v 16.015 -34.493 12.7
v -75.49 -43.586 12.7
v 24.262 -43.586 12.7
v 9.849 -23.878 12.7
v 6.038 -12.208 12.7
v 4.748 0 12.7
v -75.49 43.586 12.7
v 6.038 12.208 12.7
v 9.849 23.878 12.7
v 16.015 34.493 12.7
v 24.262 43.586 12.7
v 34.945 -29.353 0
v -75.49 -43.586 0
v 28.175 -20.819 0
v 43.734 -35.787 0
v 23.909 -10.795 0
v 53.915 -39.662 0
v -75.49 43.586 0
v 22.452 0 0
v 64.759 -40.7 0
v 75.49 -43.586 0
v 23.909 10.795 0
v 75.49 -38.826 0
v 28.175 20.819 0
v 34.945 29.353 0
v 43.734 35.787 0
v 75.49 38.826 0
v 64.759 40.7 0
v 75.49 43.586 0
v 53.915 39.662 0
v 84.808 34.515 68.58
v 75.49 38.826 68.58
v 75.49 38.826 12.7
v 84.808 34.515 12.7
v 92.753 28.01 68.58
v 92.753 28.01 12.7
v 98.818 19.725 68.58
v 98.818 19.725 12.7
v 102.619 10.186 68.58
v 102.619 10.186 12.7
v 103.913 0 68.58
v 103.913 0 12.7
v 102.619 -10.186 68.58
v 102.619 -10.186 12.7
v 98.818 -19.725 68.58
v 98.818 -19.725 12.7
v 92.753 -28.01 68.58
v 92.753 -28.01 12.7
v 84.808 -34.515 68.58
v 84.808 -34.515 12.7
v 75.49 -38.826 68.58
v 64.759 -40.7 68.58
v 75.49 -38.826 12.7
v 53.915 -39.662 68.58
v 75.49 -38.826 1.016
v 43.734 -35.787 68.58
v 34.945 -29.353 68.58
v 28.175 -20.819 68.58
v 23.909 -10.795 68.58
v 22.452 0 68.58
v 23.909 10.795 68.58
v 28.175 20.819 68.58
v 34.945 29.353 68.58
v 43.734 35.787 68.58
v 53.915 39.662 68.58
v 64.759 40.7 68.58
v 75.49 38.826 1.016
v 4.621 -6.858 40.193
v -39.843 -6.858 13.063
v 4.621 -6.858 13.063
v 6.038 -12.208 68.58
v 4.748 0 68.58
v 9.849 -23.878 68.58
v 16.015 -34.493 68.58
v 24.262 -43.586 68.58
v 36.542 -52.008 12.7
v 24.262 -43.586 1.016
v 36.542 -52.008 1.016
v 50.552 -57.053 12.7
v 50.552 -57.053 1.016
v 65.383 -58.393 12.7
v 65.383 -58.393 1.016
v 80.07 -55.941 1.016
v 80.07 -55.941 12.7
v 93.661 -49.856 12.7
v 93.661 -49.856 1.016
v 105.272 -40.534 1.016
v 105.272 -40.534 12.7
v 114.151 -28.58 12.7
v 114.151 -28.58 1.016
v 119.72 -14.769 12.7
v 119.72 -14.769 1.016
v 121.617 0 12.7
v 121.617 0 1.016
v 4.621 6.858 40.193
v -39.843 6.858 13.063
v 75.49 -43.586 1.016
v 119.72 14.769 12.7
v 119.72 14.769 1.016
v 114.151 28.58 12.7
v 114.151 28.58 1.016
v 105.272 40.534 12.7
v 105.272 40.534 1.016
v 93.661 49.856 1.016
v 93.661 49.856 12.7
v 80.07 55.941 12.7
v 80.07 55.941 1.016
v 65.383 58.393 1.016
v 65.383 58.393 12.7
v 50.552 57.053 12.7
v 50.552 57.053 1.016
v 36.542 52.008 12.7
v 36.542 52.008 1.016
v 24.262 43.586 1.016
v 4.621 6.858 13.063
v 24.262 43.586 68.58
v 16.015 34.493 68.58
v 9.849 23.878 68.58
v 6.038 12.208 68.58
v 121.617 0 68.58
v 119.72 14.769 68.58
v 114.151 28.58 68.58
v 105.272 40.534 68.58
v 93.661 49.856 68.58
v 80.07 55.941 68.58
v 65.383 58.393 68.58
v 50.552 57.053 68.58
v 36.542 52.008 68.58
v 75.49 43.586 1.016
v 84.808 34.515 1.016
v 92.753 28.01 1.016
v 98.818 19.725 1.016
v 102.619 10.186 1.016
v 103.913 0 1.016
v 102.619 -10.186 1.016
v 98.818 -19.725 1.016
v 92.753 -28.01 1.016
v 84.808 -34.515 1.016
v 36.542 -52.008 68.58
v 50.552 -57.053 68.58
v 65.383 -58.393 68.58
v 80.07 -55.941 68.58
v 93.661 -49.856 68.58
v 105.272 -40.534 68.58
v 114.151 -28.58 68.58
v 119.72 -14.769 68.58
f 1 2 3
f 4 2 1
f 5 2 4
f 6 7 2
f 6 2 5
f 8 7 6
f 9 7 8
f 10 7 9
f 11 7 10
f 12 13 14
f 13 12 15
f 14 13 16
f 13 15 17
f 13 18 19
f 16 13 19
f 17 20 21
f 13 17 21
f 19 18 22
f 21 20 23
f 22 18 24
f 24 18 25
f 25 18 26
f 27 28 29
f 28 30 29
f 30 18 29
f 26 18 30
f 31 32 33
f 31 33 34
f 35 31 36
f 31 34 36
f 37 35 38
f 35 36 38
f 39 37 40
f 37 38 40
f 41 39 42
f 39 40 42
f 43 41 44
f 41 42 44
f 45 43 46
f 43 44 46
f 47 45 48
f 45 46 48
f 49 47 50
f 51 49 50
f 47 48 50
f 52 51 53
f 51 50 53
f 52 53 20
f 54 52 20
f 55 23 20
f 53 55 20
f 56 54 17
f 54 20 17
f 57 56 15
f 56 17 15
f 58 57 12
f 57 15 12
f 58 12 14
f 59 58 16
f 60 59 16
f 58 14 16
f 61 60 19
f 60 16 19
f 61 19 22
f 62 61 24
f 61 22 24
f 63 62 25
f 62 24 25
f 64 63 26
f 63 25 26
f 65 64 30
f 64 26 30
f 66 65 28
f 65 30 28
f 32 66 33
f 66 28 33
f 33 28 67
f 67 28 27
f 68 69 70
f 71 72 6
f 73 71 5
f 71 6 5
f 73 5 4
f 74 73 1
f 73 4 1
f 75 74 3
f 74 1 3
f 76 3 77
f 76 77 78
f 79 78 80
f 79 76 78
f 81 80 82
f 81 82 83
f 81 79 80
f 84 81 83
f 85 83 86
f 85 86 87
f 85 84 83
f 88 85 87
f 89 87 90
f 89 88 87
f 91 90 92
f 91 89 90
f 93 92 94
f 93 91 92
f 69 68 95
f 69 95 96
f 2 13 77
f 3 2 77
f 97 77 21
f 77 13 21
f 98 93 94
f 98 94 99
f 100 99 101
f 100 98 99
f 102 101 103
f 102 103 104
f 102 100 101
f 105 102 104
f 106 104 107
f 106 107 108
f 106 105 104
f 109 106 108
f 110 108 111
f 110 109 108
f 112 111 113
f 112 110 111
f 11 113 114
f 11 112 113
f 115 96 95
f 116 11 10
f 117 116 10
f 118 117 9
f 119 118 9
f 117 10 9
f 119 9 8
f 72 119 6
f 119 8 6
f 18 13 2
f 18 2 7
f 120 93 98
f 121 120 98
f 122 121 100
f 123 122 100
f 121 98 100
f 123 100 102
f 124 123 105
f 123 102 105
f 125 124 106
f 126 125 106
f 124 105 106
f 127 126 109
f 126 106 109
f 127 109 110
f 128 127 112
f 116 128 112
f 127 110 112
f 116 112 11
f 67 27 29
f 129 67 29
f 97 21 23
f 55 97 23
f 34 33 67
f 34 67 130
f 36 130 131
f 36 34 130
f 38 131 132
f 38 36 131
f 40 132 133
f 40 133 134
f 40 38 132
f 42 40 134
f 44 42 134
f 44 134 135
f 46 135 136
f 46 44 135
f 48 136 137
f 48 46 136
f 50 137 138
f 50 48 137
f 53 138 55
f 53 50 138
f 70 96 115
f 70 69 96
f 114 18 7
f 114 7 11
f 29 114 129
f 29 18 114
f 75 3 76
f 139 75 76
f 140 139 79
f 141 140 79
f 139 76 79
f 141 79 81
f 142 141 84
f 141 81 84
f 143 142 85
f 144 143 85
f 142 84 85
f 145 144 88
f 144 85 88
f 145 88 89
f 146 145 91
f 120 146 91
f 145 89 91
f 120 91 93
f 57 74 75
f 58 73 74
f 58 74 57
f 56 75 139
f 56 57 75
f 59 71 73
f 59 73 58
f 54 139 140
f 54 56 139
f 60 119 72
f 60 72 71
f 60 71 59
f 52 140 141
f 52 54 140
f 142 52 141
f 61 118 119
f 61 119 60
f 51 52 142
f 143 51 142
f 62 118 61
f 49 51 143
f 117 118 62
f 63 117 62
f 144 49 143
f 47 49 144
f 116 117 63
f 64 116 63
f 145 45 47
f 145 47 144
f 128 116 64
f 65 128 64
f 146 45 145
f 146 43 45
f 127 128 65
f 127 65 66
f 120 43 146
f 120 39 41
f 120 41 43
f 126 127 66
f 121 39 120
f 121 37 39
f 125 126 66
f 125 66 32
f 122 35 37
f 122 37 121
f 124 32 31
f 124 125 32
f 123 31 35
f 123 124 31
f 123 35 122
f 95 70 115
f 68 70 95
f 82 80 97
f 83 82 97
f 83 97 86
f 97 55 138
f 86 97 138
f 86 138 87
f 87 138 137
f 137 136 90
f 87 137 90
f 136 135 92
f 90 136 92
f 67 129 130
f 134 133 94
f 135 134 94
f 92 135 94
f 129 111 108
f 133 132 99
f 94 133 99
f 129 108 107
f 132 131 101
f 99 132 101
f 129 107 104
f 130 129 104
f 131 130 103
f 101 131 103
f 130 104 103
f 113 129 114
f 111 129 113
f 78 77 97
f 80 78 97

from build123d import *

# Parameters (mm, degrees)
F0_W     = 150.9791910648
F0_H     = 87.1725007892
F1_DEPTH = 12.7
F3_DEPTH = 55.88
F4_DEPTH = 452.12
F5_DEPTH = 11.684
F7_DEPTH = 6.858


with BuildPart() as f1:
    # F0 (on Top) → F1 (new body)
    with BuildSketch(Plane.XY):
        Rectangle(F0_W, F0_H)
    extrude(amount=F1_DEPTH)

    # F2 (on face) → F3 (join)
    with BuildSketch(Plane.XY.offset(12.7)):
        with BuildLine():
            ThreePointArc((24.2620809747, 43.5862503946), (9.8493824569, 23.8775509436), (4.748277327, 0))
            Line((4.748277327, 0), (22.4522494397, 0))
            ThreePointArc((22.4522494397, 0), (39.123376192, 32.8650796795), (75.4895955324, 38.8264570725))
            Line((75.4895955324, 38.8264570725), (75.4895955324, 43.5862503946))
            Line((75.4895955324, 43.5862503946), (24.2620809747, 43.5862503946))
        make_face()
        with BuildLine():
            Line((22.4522494397, 0), (4.748277327, 0))
            ThreePointArc((4.748277327, 0), (9.8493824569, -23.8775509436), (24.2620809747, -43.5862503946))
            Line((24.2620809747, -43.5862503946), (75.4895955324, -43.5862503946))
            Line((75.4895955324, -43.5862503946), (75.4895955324, -38.8264570725))
            ThreePointArc((75.4895955324, -38.8264570725), (39.123376192, -32.8650796795), (22.4522494397, 0))
        make_face()
        with BuildLine():
            ThreePointArc((121.61681805, 0), (87.0600986321, 53.3331652316), (24.2620809747, 43.5862503946))
            Line((24.2620809747, 43.5862503946), (75.4895955324, 43.5862503946))
            Line((75.4895955324, 43.5862503946), (75.4895955324, 38.8264570725))
            ThreePointArc((75.4895955324, 38.8264570725), (96.047627368, 24.0591714965), (103.9128459373, 0))
            ThreePointArc((103.9128459373, 0), (96.047627368, -24.0591714965), (75.4895955324, -38.8264570725))
            Line((75.4895955324, -38.8264570725), (75.4895955324, -43.5862503946))
            Line((75.4895955324, -43.5862503946), (24.2620809747, -43.5862503946))
            ThreePointArc((24.2620809747, -43.5862503946), (87.0600986321, -53.3331652316), (121.61681805, 0))
        make_face()
    extrude(amount=F3_DEPTH)

    # F4 (cut): a face of the model
    f4_faces = [f1.faces().sort_by_distance(p)[0] for p in [
        (52.3222775946, 0, 12.7),
    ]]
    extrude(f4_faces, amount=-F4_DEPTH, mode=Mode.SUBTRACT)

    # F5 (add): a face of the model
    f5_faces = [f1.faces().sort_by_distance(p)[0] for p in [
        (49.8758382535, -45.1073092574, 12.7),
    ]]
    extrude(f5_faces, amount=F5_DEPTH)


with BuildPart() as f7:
    # F6 (on Front) → F7 (new body, symmetric)
    with BuildSketch(Plane.XZ):
        Polygon((4.6213758178, 13.0628570914), (4.6213758178, 40.1934087276), (-39.8425795138, 13.0628570914), align=None)
    extrude(amount=F7_DEPTH, both=True)


solid = Compound([f1.part, f7.part])
